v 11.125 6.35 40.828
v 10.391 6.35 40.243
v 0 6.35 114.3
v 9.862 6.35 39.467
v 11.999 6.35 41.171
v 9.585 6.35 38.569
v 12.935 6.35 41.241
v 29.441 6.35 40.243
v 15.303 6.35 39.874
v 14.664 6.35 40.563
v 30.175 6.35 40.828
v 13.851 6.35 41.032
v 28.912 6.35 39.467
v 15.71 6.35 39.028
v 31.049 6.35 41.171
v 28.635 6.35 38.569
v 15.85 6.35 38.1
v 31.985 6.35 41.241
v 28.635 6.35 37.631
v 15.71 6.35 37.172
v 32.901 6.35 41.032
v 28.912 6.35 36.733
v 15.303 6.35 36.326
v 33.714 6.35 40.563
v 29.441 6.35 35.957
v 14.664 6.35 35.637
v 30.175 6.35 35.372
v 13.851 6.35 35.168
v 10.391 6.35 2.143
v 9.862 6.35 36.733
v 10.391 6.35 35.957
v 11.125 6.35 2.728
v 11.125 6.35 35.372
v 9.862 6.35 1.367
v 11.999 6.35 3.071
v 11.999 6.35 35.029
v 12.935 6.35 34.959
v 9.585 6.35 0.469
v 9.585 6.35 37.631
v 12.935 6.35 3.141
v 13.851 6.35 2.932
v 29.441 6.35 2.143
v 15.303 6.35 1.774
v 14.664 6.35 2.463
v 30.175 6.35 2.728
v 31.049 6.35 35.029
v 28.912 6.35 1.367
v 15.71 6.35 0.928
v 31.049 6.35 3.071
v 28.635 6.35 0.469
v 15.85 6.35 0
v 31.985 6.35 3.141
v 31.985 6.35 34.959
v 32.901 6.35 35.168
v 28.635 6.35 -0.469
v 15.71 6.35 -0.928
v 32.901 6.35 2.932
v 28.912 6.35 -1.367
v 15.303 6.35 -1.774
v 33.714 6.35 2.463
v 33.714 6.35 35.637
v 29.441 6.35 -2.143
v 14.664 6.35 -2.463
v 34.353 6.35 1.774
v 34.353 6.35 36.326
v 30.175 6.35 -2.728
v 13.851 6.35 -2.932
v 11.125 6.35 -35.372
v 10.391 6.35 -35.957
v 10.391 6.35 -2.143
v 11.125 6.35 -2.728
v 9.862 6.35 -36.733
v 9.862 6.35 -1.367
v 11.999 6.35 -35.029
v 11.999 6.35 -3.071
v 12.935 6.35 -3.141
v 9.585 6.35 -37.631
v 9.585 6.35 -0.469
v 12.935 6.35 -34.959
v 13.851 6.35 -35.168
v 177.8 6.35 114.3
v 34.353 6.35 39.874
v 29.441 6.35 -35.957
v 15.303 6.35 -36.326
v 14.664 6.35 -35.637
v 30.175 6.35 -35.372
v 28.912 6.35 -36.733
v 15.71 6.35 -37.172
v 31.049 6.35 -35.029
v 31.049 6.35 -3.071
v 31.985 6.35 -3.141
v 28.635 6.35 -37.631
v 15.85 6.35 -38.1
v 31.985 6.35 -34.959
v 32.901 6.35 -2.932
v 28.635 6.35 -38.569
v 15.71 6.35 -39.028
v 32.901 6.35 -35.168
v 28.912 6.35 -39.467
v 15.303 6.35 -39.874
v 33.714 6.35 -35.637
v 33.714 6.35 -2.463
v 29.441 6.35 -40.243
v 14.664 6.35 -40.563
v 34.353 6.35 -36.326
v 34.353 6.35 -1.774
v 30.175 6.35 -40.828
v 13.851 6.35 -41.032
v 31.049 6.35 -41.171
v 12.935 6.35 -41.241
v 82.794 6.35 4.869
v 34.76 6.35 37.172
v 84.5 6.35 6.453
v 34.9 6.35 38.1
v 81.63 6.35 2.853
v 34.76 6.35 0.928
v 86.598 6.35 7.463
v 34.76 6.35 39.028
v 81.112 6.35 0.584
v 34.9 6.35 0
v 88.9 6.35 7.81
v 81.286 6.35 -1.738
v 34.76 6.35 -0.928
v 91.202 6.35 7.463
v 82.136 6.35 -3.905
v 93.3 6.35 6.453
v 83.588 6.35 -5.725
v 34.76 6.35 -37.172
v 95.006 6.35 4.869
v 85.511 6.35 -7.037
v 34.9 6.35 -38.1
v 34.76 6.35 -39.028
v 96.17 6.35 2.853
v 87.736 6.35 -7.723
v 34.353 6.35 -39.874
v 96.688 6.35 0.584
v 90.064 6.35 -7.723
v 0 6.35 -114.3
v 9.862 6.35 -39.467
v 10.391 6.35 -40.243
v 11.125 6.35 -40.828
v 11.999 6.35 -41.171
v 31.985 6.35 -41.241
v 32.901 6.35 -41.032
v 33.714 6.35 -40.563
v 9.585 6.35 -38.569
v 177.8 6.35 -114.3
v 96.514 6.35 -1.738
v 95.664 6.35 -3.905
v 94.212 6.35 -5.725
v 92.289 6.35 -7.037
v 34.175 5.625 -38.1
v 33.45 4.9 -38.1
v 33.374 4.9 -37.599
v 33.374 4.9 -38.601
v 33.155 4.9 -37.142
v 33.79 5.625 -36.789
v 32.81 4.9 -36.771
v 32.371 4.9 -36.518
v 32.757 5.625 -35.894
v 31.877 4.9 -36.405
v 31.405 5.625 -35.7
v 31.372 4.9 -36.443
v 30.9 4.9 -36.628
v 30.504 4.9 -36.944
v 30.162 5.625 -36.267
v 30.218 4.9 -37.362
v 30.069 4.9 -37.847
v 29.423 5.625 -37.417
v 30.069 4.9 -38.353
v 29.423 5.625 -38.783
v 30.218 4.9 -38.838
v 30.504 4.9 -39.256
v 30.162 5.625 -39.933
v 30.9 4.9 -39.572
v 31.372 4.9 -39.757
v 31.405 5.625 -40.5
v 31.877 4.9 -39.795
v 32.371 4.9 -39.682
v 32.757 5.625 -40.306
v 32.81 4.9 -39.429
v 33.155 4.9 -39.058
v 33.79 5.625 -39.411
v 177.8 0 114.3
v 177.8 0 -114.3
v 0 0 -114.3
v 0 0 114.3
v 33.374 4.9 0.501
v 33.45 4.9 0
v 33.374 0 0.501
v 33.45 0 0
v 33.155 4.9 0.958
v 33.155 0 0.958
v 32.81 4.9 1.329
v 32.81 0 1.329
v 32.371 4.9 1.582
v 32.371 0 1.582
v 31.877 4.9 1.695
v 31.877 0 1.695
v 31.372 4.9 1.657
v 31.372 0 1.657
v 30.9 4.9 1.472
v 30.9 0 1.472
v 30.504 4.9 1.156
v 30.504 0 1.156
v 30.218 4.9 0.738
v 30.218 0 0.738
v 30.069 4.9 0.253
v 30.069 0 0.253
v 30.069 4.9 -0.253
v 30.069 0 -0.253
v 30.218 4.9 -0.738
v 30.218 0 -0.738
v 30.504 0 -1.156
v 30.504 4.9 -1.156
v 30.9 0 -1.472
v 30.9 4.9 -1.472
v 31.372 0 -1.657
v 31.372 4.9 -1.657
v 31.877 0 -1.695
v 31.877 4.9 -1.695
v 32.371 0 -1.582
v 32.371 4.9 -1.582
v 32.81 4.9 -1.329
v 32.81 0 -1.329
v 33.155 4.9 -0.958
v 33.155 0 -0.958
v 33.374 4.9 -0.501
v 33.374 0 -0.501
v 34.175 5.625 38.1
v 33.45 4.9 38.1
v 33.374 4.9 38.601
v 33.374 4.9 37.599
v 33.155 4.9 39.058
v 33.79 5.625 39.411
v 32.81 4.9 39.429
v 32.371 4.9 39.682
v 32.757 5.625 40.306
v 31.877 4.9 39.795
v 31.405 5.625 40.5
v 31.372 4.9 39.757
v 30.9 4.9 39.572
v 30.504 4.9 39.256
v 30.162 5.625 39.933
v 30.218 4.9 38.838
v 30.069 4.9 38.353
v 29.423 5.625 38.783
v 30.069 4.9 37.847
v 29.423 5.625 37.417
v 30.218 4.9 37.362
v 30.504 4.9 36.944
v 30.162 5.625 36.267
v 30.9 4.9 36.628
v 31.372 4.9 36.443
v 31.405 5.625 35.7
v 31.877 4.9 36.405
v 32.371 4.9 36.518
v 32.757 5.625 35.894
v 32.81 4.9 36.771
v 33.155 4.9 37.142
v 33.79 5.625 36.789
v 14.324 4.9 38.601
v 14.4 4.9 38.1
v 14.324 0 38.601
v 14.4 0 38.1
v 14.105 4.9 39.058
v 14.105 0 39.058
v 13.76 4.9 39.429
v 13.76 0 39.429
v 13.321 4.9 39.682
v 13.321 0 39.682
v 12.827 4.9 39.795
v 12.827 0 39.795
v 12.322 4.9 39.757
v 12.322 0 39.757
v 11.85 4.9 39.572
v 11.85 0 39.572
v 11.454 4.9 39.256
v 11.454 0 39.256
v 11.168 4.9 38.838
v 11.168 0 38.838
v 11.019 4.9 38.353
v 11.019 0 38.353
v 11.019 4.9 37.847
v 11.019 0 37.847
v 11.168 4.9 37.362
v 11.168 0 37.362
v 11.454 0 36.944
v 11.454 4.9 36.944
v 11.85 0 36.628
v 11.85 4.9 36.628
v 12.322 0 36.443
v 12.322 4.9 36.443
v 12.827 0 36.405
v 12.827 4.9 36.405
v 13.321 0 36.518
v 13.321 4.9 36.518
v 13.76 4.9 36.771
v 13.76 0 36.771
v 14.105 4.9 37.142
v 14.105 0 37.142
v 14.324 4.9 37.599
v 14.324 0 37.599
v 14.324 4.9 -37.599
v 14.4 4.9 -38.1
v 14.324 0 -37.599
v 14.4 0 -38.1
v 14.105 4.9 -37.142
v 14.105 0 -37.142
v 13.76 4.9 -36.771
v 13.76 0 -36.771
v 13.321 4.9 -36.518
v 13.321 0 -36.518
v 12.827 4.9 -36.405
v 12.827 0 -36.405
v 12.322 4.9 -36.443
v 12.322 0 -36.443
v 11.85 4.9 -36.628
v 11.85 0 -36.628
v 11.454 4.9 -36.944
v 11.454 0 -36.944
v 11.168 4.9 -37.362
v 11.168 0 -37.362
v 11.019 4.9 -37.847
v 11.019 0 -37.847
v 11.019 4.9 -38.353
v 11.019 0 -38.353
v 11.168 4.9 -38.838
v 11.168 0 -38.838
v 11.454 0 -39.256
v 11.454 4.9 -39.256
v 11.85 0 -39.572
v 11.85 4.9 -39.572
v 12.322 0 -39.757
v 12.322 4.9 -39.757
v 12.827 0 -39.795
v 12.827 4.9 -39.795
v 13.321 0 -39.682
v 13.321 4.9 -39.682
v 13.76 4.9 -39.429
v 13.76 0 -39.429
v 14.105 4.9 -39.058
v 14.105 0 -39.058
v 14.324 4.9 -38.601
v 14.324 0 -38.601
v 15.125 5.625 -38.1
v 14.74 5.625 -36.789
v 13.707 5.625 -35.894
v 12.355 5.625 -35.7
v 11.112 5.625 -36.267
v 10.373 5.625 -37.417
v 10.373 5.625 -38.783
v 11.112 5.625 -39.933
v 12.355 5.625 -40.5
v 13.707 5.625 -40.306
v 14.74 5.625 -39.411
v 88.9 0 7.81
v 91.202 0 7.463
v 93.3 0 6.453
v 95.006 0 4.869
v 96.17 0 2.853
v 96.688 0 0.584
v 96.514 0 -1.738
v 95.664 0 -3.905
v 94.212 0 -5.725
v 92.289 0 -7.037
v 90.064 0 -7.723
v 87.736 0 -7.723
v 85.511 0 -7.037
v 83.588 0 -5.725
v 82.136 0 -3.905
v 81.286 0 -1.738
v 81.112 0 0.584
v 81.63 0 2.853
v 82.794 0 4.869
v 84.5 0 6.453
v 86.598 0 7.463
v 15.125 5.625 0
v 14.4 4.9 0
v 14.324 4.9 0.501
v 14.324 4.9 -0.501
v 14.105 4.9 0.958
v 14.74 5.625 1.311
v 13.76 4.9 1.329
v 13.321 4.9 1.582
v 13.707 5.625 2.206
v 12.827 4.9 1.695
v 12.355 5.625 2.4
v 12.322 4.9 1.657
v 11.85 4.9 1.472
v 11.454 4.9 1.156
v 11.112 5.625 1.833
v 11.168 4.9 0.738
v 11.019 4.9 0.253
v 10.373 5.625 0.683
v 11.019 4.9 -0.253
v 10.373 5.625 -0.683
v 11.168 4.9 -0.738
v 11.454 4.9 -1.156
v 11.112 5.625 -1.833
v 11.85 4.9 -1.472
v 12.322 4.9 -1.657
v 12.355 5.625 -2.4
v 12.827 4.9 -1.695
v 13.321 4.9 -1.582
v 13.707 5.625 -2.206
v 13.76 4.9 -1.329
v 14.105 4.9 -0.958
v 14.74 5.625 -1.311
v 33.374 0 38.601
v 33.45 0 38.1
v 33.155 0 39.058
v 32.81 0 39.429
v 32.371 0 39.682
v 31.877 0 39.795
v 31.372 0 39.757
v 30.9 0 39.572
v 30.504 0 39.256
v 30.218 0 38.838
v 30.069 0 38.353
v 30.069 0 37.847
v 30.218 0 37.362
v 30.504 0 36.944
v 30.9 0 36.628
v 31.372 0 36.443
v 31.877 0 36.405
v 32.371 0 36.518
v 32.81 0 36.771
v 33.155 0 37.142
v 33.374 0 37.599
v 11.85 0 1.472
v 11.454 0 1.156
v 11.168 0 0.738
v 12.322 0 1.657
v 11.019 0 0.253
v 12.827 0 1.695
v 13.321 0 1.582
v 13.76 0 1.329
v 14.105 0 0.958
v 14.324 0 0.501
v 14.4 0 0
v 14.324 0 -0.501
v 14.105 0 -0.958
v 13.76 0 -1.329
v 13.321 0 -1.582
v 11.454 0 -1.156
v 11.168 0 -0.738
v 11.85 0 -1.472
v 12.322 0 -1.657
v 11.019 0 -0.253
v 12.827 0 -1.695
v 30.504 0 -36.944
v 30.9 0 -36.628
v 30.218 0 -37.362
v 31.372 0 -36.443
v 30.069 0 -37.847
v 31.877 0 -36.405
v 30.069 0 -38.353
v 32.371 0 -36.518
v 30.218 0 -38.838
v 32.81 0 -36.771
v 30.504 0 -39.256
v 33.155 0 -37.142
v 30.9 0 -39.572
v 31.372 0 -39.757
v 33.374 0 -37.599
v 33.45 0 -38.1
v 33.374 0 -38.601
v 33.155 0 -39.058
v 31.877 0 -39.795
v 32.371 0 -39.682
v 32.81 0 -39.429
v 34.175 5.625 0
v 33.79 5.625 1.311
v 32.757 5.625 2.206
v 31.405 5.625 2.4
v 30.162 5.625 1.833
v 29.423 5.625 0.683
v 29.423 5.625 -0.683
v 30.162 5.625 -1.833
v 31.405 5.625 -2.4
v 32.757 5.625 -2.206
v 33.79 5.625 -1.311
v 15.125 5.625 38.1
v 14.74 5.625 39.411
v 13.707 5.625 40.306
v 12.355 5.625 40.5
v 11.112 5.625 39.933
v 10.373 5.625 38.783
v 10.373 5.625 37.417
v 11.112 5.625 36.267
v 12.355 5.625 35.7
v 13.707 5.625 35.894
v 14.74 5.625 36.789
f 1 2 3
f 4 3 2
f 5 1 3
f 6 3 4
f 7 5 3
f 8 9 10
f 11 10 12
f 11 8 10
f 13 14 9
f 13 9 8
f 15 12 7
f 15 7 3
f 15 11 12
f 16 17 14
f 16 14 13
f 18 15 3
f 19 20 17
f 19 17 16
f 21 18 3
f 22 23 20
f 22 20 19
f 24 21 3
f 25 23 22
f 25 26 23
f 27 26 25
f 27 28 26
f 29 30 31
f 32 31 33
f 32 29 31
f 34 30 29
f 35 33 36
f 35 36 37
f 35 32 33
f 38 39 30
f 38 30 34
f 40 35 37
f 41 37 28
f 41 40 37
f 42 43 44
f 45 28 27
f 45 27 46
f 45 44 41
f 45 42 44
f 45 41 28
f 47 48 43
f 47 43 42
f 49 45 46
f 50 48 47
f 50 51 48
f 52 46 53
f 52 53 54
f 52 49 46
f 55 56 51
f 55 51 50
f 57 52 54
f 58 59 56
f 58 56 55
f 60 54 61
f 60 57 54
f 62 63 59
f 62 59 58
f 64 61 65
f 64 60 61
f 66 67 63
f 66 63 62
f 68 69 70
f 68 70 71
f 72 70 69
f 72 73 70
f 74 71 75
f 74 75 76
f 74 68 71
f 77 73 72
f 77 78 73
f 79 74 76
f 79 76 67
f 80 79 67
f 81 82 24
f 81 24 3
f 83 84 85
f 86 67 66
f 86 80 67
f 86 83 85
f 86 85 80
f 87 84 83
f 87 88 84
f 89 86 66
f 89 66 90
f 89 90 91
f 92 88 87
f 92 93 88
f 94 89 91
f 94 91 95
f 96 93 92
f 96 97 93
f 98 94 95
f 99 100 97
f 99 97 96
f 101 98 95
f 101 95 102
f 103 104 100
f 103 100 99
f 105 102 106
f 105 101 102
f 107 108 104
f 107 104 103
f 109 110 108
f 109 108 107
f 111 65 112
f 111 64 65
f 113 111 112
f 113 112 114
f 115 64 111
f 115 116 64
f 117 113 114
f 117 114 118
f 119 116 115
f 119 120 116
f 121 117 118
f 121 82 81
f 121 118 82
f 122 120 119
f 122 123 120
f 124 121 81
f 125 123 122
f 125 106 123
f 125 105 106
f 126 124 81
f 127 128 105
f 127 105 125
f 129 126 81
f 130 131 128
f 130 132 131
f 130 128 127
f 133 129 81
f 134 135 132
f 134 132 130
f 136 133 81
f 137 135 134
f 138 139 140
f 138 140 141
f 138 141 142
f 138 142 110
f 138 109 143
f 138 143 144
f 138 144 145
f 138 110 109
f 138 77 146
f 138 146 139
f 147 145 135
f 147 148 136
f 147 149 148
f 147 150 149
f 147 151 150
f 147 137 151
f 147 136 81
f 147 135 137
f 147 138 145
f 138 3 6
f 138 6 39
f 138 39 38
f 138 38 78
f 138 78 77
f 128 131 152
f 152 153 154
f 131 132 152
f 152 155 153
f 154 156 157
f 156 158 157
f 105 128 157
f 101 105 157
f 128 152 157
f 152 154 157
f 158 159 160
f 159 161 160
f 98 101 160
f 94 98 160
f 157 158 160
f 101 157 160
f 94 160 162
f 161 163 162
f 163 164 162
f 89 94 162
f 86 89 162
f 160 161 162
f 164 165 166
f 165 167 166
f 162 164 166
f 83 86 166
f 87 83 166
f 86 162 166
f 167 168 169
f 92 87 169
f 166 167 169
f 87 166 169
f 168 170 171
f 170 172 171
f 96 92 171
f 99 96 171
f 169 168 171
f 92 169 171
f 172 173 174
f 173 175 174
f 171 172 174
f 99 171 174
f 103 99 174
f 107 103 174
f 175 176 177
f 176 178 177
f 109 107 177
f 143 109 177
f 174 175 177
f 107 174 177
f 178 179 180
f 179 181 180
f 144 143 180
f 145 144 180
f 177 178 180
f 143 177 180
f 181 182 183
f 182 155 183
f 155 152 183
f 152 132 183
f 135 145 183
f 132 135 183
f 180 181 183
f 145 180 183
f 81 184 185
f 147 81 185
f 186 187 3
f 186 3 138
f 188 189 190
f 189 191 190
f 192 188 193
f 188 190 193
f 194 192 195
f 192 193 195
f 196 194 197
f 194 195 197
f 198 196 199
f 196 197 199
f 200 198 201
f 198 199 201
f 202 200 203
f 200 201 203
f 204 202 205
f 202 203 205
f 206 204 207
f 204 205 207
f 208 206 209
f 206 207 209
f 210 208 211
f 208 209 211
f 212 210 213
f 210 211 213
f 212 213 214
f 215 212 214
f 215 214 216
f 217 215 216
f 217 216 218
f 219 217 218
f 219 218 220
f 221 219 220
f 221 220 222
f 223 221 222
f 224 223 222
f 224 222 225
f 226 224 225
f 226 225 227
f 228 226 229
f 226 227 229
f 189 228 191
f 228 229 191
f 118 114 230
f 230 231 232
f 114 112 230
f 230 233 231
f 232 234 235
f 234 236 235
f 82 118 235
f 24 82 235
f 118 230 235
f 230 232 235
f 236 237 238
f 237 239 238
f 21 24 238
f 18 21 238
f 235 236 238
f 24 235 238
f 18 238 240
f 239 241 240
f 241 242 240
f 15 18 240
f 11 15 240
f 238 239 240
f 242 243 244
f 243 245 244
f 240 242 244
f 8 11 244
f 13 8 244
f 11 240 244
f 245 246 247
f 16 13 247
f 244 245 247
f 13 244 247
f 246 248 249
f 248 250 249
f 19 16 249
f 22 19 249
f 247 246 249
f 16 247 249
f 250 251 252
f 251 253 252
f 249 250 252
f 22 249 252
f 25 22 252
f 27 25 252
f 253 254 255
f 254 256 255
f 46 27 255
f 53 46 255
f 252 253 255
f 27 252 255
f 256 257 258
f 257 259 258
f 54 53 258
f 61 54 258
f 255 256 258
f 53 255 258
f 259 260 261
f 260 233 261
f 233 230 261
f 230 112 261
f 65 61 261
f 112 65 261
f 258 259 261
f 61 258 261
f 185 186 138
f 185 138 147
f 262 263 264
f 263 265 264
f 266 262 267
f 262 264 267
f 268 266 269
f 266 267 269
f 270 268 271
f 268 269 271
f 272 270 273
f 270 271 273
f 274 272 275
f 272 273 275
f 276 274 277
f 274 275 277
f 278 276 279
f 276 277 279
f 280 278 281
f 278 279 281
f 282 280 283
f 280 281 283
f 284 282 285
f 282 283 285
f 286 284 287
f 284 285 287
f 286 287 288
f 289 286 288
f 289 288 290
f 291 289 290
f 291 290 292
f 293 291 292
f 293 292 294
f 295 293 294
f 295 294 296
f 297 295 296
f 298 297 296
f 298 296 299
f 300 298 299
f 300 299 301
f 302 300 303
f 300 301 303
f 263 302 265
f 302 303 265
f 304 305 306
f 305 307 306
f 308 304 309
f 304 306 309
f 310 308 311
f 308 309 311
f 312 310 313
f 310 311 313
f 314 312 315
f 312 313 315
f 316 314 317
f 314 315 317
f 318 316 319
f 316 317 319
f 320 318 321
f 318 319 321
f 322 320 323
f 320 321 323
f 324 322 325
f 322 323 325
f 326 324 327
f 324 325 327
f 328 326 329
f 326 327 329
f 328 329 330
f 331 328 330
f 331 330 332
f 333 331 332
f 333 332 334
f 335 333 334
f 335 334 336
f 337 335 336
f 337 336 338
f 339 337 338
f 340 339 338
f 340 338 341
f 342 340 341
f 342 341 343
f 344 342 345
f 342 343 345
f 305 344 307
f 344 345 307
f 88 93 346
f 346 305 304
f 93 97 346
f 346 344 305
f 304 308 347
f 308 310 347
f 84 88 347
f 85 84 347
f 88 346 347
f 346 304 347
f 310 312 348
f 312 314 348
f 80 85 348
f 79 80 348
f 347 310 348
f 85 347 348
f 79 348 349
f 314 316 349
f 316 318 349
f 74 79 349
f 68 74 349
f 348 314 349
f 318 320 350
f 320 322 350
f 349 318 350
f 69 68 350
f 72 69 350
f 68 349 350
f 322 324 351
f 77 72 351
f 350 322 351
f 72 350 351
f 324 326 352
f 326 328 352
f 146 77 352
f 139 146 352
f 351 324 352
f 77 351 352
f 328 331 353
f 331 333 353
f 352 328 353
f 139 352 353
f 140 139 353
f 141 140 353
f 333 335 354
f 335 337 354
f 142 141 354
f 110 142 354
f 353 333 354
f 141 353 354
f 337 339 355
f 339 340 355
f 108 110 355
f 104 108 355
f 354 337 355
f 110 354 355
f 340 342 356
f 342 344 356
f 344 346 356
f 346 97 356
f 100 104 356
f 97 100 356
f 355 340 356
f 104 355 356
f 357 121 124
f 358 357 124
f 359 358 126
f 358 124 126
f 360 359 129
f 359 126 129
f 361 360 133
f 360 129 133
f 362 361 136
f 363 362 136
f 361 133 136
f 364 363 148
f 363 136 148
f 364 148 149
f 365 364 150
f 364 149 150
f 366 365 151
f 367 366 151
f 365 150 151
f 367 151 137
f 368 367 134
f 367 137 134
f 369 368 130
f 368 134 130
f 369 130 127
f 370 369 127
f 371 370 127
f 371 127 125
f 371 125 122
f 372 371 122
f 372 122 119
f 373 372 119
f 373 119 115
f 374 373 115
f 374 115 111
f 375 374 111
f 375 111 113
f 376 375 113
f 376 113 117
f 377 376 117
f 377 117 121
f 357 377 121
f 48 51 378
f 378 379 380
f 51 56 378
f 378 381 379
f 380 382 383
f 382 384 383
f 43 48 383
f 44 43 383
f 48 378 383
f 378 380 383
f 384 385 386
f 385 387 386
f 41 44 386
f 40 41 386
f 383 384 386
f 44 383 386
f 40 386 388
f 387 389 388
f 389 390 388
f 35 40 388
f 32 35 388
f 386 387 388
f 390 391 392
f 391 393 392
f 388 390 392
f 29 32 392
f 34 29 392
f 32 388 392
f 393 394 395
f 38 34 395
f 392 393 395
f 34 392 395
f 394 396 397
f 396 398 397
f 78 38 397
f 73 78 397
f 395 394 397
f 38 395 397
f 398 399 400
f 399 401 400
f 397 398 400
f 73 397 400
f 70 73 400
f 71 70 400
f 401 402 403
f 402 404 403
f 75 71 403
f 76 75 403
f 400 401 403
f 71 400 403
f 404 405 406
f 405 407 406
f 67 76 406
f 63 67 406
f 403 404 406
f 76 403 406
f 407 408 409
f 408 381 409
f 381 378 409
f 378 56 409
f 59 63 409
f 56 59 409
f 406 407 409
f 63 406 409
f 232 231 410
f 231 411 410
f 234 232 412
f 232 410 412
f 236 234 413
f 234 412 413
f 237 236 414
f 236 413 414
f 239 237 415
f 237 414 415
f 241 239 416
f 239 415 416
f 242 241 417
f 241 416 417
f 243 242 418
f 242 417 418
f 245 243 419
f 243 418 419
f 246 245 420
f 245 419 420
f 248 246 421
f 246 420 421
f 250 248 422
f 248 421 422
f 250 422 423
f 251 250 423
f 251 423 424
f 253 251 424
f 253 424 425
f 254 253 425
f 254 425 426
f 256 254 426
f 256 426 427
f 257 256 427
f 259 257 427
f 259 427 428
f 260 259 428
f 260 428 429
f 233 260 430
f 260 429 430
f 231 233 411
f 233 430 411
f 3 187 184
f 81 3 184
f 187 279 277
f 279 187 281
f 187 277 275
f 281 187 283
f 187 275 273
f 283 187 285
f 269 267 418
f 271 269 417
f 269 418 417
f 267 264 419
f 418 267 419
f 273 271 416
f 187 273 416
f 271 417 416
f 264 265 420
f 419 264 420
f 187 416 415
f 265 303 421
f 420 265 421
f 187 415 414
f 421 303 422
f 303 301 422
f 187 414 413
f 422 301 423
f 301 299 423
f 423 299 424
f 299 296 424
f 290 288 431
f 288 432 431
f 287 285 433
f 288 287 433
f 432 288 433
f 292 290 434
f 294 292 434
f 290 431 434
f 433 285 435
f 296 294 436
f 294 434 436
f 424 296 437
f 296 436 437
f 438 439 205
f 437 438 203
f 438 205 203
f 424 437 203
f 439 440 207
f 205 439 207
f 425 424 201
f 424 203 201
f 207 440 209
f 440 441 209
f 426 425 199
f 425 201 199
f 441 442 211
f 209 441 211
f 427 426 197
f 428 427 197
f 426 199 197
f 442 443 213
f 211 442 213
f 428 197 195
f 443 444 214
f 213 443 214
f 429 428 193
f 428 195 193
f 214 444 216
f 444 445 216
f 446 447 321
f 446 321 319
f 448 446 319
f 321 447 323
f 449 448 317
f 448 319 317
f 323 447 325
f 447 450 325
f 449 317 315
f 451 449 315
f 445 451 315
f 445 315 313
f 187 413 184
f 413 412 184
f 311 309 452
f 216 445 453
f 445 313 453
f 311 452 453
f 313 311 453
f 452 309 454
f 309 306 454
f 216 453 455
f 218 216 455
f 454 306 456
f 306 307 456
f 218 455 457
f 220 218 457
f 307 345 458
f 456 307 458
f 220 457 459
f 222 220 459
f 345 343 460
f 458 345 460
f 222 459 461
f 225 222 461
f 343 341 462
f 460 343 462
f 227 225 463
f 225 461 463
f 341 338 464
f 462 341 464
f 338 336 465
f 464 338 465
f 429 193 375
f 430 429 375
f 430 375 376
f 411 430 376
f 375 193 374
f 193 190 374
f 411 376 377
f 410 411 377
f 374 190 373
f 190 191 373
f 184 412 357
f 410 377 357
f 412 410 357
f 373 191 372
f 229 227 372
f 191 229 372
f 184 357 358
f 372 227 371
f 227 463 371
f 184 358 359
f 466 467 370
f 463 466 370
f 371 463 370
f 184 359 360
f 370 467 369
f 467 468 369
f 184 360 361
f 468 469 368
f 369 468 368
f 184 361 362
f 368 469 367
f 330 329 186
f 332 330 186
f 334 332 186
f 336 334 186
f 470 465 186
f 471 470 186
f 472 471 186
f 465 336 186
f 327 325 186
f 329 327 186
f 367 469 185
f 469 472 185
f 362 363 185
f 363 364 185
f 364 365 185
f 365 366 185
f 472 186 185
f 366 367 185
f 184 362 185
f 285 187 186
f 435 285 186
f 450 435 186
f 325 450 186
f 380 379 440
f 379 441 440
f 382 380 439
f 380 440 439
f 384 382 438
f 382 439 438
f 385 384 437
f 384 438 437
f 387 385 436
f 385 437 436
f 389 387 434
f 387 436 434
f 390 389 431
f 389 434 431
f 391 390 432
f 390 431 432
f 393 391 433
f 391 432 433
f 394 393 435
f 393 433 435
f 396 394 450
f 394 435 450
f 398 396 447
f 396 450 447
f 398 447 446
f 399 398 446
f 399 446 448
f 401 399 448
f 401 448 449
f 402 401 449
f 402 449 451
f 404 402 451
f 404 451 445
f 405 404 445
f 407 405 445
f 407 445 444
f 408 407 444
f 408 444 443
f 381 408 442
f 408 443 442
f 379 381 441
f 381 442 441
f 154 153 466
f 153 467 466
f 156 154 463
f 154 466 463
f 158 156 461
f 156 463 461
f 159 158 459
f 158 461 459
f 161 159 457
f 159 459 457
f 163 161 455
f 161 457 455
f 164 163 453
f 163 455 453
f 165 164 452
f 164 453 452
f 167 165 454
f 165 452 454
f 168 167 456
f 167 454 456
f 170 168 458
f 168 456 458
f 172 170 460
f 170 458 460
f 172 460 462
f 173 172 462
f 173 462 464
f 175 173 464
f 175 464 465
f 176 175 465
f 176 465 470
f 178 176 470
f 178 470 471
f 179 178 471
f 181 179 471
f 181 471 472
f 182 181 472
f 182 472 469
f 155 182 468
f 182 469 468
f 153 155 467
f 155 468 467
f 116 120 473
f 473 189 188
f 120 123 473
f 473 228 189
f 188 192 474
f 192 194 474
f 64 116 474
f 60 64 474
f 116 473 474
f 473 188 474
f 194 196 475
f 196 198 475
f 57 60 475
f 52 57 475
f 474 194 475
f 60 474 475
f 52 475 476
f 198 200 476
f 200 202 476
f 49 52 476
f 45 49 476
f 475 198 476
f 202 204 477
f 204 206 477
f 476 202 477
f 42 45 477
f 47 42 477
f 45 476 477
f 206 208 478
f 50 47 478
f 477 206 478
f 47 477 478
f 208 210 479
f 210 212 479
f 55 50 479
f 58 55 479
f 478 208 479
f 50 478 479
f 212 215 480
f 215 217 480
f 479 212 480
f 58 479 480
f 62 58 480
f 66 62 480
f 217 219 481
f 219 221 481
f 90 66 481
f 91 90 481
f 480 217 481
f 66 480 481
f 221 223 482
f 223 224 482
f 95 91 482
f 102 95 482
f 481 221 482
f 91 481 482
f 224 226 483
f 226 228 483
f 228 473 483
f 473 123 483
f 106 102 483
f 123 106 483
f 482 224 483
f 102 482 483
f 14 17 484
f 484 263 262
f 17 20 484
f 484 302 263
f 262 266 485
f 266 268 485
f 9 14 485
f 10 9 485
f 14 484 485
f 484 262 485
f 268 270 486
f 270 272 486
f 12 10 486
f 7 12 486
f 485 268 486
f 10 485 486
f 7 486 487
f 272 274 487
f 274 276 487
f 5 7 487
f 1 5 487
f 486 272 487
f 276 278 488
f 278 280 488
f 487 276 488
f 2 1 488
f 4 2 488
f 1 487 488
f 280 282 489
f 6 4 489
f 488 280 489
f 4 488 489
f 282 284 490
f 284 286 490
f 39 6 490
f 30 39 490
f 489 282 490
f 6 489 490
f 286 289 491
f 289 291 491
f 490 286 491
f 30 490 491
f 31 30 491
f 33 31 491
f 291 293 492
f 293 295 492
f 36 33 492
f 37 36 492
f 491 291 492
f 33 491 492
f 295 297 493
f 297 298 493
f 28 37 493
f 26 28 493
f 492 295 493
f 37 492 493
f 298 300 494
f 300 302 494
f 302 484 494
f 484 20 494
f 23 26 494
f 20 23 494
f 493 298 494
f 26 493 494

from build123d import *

# Parameters (mm, degrees)
SKETCH1_W                                            = 177.8
SKETCH1_H                                            = 228.6
BOSS_EXTRUDE1_DEPTH                                  = 6.35
CUT_EXTRUDE1_REACH                                   = 213.465
SKETCH6_R                                            = 7.810000001
THREADED_CSK_FOR_M3_10_FLAT_HEAD_MACHINE_D           = 3.4
THREADED_CSK_FOR_M3_10_FLAT_HEAD_MACHINE_CSINK_D     = 6.3
THREADED_CSK_FOR_M3_10_FLAT_HEAD_MACHINE_CSINK_ANGLE = 90


with BuildPart() as part:
    # Sketch1 → Boss-Extrude1 (new body)
    with BuildSketch(Plane(origin=(0, 0, 0), x_dir=(1, 0, 0), z_dir=(0, 1, 0))):
        with Locations((88.9, 0)):
            Rectangle(SKETCH1_W, SKETCH1_H)
    extrude(amount=BOSS_EXTRUDE1_DEPTH)

    # Sketch6 → Cut-Extrude1 (cut, up to next)
    with BuildSketch(Plane(origin=(0, 6.35, 0), x_dir=(1, 0, 0), z_dir=(0, 1, 0)), mode=Mode.PRIVATE) as cut_extrude1_sk1:
        with Locations(Location((88.9, 0, 0), (0, 0, 270))):
            Circle(SKETCH6_R)
    cut_extrude1_tool1 = extrude(cut_extrude1_sk1.sketch, amount=-CUT_EXTRUDE1_REACH, mode=Mode.PRIVATE) & part.part
    add(cut_extrude1_tool1.solids().sort_by_distance((88.9, 6.35, 0))[0], mode=Mode.SUBTRACT)

    # Threaded CSK for M3-10 Flat Head Machine Screw1 (through all)
    with Locations(Plane(origin=(0, 6.35, 0), x_dir=(-1, 0, 0), z_dir=(0, 1, 0))):
        with Locations((-12.7, 0), (-12.7, 38.1), (-31.75, 38.1), (-12.7, -38.1), (-31.75, -38.1), (-31.75, 0)):
            CounterSinkHole(THREADED_CSK_FOR_M3_10_FLAT_HEAD_MACHINE_D / 2, THREADED_CSK_FOR_M3_10_FLAT_HEAD_MACHINE_CSINK_D / 2, counter_sink_angle=THREADED_CSK_FOR_M3_10_FLAT_HEAD_MACHINE_CSINK_ANGLE)


solid = part.part
